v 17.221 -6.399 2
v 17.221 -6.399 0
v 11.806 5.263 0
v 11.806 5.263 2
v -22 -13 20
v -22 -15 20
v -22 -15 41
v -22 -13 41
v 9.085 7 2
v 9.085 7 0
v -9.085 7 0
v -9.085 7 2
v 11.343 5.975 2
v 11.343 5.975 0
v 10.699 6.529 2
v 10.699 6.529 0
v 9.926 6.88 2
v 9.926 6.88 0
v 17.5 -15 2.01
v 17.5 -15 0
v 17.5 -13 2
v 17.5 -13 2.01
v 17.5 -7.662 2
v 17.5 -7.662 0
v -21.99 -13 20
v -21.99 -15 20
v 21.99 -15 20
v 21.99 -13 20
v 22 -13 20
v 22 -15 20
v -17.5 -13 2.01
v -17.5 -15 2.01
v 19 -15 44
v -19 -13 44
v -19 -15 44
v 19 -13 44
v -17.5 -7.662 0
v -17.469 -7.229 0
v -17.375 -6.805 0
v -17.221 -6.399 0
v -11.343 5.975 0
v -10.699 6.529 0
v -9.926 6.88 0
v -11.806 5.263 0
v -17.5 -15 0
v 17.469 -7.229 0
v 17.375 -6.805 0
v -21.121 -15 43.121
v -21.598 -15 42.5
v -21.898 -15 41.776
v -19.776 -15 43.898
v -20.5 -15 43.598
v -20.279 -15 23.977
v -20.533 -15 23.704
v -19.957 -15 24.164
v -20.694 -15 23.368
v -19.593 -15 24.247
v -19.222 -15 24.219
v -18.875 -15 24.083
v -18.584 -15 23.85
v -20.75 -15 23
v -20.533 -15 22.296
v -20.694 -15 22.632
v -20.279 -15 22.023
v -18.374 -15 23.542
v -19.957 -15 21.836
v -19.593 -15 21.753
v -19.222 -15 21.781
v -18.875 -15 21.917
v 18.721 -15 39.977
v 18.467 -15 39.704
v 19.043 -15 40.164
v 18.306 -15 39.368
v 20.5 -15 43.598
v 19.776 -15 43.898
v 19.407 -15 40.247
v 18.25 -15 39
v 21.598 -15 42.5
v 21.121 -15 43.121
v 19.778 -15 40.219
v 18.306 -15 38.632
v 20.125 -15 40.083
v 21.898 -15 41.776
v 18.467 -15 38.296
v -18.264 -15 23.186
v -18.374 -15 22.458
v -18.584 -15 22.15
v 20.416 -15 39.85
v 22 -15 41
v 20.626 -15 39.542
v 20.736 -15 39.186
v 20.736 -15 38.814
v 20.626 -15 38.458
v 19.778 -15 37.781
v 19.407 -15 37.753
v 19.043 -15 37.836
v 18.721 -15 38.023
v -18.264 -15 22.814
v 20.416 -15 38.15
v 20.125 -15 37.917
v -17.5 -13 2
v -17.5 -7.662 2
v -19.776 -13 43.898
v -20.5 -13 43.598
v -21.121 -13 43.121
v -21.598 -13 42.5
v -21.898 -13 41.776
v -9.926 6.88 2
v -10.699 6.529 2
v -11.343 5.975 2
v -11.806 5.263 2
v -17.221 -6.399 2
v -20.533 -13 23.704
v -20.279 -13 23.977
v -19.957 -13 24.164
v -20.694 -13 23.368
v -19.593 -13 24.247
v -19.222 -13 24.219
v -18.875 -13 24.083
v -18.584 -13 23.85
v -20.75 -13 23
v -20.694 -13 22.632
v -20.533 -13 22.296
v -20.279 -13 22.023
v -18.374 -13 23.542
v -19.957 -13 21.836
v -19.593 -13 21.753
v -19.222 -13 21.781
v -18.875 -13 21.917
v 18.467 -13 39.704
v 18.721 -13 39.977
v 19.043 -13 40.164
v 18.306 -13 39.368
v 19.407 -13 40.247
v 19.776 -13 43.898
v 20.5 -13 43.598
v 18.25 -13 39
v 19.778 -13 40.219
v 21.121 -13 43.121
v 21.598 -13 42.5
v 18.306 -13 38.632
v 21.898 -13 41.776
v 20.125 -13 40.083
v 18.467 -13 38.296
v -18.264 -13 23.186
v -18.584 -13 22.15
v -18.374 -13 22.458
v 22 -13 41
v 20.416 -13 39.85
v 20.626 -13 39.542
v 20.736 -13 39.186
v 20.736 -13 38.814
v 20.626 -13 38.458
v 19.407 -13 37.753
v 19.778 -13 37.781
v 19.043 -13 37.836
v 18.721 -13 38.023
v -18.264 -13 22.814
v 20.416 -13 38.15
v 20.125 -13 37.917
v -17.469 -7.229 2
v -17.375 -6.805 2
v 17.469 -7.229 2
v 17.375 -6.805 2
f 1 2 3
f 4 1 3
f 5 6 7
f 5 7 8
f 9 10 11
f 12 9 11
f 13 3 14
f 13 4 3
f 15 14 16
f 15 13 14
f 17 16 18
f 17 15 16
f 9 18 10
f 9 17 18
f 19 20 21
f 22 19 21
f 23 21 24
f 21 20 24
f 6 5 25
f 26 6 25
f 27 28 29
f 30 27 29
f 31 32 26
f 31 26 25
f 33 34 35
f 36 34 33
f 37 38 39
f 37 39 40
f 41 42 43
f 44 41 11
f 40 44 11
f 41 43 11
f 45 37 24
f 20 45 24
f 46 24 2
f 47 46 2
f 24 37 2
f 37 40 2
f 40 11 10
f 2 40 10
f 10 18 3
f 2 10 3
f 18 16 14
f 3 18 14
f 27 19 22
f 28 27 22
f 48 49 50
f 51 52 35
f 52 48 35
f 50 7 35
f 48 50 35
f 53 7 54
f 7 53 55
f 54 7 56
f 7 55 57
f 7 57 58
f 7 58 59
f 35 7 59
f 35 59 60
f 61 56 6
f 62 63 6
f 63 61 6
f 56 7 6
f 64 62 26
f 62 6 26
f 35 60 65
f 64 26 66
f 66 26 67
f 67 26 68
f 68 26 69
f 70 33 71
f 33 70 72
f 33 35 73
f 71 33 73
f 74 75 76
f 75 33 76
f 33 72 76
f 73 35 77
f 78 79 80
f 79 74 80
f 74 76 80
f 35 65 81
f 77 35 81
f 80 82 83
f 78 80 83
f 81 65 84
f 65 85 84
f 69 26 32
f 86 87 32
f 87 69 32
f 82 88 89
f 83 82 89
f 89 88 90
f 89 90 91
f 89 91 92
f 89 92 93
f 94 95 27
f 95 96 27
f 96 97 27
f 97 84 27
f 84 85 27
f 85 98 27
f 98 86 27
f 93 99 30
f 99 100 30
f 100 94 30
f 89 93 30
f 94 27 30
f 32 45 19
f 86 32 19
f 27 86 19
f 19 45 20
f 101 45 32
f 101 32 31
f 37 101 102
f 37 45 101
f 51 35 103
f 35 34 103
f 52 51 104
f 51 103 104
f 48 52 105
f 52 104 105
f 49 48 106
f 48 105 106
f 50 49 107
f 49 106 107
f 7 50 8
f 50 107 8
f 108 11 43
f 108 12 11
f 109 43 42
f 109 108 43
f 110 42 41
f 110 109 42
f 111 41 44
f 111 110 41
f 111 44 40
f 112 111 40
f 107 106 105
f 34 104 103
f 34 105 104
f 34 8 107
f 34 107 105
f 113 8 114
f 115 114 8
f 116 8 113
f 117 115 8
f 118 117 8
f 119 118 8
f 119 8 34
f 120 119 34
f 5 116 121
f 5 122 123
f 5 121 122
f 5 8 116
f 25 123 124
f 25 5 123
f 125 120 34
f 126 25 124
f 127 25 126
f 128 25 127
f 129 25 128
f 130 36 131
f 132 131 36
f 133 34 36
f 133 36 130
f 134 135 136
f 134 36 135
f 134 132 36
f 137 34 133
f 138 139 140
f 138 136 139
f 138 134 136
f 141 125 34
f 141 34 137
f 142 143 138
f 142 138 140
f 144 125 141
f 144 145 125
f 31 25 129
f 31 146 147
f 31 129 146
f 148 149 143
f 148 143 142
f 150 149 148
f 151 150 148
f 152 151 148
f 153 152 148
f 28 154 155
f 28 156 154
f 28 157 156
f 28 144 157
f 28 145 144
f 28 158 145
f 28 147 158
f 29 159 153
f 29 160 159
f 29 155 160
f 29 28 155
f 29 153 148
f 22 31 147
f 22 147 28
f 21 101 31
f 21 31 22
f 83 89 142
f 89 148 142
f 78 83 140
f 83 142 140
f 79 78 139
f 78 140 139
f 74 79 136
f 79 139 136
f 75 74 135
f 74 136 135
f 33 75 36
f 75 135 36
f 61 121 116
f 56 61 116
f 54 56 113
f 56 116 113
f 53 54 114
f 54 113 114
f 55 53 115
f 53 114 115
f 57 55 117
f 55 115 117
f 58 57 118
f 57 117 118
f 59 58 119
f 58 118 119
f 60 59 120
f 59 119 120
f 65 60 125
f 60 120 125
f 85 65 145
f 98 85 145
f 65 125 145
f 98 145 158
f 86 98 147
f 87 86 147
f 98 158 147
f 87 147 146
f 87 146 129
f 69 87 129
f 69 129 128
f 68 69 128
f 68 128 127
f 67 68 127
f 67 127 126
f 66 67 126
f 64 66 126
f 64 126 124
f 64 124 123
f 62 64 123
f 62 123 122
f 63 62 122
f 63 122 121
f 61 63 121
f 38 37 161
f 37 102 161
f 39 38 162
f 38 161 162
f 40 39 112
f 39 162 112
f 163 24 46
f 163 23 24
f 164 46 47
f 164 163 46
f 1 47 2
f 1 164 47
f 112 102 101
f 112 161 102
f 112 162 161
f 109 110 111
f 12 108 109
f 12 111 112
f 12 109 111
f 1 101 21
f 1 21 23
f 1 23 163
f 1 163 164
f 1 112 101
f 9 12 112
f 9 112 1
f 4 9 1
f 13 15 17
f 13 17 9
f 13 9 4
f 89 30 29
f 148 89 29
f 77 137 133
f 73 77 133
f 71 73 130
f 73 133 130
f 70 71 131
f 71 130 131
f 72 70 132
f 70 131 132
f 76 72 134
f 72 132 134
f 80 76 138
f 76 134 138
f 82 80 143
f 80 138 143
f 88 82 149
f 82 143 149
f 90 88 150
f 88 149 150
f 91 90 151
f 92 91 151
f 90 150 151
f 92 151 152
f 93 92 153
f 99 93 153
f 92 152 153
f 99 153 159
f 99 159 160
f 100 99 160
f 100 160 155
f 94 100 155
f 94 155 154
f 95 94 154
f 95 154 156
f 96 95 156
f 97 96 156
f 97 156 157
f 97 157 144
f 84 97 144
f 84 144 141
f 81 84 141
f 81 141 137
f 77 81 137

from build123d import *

# Parameters (mm, degrees)
PAD_DEPTH       = 2
SKETCH001_W     = 35
SKETCH001_H     = 2
PAD001_DEPTH    = 18
SKETCH002_W     = 44
SKETCH002_H     = 2
PAD002_DEPTH    = 24
CHAMFER_1_SIZE2 = 17.99
CHAMFER_1_SIZE  = 4.49
CHAMFER_2_SIZE2 = 17.99
CHAMFER_2_SIZE  = 4.49
FILLET_R        = 3
SKETCH003_R     = 1.25
POCKET_DEPTH    = 5


with BuildPart() as part:
    # Sketch → Pad (new body)
    with BuildSketch(Plane.XY):
        Polygon((-17.5, -15), (17.5, -15), (17.5, -7), (11, 7), (-11, 7), (-17.5, -7), align=None)
    extrude(amount=PAD_DEPTH)

    # Sketch001 (on Face8 of Pad) → Pad001 (join)
    with BuildSketch(Plane.XY.offset(2)):
        with Locations((0, -14)):
            Rectangle(SKETCH001_W, SKETCH001_H)
    extrude(amount=PAD001_DEPTH)

    # Sketch002 (on Face12 of Pad001) → Pad002 (join)
    with BuildSketch(Plane.XY.offset(20)):
        with Locations((0, -14)):
            Rectangle(SKETCH002_W, SKETCH002_H)
    extrude(amount=PAD002_DEPTH)

    # Chamfer 1
    chamfer_1_edges = [part.edges().sort_by_distance(p)[0] for p in [
        (-17.5, -14, 20),
    ]]
    chamfer_1_side = part.faces().sort_by_distance((-19.75, -14, 20))[0]
    chamfer(chamfer_1_edges, length=CHAMFER_1_SIZE, length2=CHAMFER_1_SIZE2, reference=chamfer_1_side)

    # Chamfer 2
    chamfer_2_edges = [part.edges().sort_by_distance(p)[0] for p in [
        (17.5, -14, 20),
    ]]
    chamfer_2_side = part.faces().sort_by_distance((19.75, -14, 20))[0]
    chamfer(chamfer_2_edges, length=CHAMFER_2_SIZE, length2=CHAMFER_2_SIZE2, reference=chamfer_2_side)

    # Fillet
    fillet_edges = [part.edges().sort_by_distance(p)[0] for p in [
        (22, -14, 44),
        (17.5, -7, 1),
        (11, 7, 1),
        (-11, 7, 1),
        (-17.5, -7, 1),
        (-22, -14, 44),
    ]]
    fillet(fillet_edges, radius=FILLET_R)

    # Sketch003 (on Face1 of Fillet) → Pocket (cut)
    with BuildSketch(Plane(origin=(0, -13, 0), x_dir=(-1, 0, 0), z_dir=(0, 1, 0))):
        with Locations((-19.5, 39)):
            Circle(SKETCH003_R)
        with Locations((19.5, 23)):
            Circle(SKETCH003_R)
    extrude(amount=-POCKET_DEPTH, mode=Mode.SUBTRACT)


solid = part.part
